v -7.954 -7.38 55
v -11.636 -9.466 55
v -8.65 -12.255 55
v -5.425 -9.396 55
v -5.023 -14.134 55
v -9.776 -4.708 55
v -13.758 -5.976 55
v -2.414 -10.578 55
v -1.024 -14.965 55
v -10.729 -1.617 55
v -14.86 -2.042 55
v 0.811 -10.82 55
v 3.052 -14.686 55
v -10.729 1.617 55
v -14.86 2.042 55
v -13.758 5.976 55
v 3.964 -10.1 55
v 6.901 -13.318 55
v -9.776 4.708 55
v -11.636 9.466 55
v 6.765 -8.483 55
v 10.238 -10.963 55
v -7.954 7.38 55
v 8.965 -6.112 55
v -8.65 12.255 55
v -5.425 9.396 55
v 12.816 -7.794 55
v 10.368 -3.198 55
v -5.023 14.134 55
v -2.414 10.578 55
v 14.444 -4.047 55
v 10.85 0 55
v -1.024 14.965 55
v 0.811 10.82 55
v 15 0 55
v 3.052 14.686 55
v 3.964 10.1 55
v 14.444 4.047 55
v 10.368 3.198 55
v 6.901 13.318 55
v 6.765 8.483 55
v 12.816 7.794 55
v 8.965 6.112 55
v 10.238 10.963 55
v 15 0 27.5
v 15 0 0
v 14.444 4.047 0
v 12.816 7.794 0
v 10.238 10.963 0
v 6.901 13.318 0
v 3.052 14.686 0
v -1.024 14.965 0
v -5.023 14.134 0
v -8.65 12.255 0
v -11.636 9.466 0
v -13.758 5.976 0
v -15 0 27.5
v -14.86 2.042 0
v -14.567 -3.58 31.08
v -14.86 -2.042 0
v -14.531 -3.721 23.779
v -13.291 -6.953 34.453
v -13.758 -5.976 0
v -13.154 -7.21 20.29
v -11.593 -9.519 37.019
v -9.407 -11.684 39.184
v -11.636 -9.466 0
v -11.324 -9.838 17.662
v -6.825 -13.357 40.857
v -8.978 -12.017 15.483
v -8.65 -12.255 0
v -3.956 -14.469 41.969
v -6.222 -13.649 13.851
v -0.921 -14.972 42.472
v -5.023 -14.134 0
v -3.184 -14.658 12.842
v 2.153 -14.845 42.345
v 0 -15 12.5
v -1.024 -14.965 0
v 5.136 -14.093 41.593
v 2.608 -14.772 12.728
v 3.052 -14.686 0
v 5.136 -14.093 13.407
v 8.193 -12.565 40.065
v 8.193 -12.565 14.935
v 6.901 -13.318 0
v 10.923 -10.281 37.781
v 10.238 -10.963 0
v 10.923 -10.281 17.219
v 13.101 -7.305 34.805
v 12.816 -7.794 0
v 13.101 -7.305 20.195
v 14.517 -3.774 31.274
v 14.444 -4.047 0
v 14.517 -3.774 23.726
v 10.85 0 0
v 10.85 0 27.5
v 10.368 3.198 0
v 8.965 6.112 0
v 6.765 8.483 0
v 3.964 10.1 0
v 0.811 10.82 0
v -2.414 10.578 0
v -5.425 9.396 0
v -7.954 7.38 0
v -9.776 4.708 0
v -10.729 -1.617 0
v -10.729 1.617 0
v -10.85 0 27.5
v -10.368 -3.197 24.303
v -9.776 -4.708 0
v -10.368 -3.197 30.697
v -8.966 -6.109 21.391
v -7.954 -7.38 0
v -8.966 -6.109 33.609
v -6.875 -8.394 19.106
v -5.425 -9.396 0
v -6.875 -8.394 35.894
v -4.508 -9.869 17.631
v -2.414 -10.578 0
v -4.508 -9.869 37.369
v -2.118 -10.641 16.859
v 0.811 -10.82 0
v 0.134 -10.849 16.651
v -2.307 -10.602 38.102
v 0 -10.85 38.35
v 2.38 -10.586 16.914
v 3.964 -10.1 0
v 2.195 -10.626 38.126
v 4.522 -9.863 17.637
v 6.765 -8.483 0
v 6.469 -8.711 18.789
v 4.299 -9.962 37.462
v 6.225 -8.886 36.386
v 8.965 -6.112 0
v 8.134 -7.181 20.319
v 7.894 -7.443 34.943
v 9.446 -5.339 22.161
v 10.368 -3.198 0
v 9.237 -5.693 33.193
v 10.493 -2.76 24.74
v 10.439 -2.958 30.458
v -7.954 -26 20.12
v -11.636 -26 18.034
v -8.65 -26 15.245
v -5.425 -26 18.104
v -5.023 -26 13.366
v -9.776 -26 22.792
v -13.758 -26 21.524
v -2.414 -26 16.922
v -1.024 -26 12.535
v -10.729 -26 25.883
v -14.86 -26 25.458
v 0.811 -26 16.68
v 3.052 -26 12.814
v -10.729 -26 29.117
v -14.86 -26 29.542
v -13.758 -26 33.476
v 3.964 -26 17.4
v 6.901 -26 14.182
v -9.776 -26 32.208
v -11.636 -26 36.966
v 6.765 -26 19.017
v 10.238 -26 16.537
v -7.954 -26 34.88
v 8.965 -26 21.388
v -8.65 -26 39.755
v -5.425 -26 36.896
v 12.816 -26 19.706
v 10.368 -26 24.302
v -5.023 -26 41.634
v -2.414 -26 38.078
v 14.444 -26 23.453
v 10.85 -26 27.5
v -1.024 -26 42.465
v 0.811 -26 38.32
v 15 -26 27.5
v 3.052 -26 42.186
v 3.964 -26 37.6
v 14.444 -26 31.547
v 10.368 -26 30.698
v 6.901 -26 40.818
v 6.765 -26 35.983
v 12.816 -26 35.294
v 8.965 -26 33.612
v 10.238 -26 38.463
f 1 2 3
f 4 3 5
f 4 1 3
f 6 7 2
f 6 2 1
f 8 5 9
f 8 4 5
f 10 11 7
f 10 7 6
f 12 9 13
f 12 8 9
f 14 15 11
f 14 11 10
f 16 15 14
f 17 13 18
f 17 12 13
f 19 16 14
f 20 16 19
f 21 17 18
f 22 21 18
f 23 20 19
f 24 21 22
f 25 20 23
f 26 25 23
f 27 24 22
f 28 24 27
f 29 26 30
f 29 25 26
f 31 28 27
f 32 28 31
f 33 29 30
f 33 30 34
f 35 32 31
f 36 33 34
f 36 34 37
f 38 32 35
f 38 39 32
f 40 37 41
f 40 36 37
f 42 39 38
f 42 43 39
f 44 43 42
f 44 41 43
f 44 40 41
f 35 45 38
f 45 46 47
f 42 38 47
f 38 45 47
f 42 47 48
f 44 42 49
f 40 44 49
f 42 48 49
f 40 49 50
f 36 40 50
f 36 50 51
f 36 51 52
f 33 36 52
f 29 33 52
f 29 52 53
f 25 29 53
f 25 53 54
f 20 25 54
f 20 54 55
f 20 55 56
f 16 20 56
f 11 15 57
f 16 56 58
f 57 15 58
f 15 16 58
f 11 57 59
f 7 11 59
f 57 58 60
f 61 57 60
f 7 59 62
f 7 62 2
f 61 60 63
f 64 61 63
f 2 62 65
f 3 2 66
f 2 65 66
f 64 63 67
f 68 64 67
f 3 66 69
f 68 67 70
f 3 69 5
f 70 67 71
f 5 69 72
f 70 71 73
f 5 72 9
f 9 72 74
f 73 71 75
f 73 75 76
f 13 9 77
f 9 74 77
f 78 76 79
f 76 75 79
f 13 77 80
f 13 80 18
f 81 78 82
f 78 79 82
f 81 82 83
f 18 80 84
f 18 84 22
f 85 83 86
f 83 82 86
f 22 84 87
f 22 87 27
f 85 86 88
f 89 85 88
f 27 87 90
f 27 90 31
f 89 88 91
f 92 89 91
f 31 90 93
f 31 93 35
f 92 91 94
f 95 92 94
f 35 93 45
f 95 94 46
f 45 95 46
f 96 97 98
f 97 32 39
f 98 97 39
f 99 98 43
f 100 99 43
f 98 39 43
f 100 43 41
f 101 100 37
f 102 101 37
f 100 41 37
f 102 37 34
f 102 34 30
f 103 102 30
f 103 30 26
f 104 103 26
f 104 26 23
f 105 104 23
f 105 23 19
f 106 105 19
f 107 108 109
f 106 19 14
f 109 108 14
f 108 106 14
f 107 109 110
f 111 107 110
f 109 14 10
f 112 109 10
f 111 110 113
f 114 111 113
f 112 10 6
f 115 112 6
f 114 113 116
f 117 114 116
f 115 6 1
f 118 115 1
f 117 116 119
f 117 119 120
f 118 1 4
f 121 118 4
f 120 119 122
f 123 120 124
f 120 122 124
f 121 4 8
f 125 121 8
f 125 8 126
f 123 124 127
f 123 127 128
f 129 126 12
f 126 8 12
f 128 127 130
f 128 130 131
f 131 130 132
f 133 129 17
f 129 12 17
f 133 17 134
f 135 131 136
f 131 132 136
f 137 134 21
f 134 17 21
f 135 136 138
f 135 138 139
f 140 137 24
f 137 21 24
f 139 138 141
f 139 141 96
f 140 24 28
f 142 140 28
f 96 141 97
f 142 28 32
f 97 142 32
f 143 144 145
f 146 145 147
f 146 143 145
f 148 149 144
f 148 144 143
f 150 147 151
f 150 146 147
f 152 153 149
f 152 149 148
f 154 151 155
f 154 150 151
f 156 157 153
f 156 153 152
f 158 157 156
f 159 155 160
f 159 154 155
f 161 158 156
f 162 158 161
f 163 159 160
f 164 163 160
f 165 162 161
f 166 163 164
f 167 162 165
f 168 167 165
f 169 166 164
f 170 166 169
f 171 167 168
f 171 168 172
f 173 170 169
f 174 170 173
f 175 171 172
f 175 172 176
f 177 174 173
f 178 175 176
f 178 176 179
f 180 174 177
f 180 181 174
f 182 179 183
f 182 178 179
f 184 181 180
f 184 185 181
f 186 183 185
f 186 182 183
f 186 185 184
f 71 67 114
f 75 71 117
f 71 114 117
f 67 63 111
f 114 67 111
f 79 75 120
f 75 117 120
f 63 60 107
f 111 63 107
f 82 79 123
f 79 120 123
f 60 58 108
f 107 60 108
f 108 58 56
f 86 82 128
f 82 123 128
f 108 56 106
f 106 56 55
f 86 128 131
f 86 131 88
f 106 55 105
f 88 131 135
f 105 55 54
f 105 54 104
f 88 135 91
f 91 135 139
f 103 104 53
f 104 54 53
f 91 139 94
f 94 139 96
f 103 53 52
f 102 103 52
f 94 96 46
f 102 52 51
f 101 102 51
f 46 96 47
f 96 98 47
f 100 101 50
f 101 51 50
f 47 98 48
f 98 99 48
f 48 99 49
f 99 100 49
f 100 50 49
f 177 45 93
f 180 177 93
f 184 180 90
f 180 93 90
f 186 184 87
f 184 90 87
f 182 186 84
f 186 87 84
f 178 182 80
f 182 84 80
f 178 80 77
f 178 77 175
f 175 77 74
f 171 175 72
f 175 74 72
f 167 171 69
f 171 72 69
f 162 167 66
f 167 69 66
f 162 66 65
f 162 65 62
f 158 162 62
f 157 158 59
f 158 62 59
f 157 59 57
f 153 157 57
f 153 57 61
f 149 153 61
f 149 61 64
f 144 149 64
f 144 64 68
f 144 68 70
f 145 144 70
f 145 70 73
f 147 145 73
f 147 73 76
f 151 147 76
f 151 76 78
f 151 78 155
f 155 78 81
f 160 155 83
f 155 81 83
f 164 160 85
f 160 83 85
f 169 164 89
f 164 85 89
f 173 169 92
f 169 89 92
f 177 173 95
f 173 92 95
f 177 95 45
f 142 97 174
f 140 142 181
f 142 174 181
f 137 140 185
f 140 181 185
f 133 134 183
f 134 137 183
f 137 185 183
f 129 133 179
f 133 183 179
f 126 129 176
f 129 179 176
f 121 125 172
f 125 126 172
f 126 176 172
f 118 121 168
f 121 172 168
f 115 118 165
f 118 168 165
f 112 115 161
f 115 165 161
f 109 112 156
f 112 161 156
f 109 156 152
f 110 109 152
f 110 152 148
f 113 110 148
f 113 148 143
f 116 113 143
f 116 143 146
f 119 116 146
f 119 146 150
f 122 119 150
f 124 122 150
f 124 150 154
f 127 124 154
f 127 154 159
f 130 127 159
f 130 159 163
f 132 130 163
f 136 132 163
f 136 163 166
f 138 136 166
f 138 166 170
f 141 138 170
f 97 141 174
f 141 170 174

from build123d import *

# Parameters (mm, degrees)
F0_R     = 15
F1_DEPTH = 55
F2_R     = 15
F3_DEPTH = 26
F4_R     = 10.85
F5_DEPTH = 55
F6_R     = 10.85
F7_DEPTH = 26


with BuildPart() as f1:
    # F0 (on Top) → F1 (new body)
    with BuildSketch(Plane.XY):
        Circle(F0_R)
    extrude(amount=F1_DEPTH)

    # F2 (on Front) → F3 (join)
    with BuildSketch(Plane.XZ):
        with Locations((0, 27.5)):
            Circle(F2_R)
    extrude(amount=F3_DEPTH)

    # F4 (on face) → F5 (cut)
    with BuildSketch(Plane.XY.offset(55)):
        Circle(F4_R)
    extrude(amount=-F5_DEPTH, mode=Mode.SUBTRACT)

    # F6 (on face) → F7 (cut)
    with BuildSketch(Plane.XZ.offset(26)):
        with Locations((0, 27.5)):
            Circle(F6_R)
    extrude(amount=-F7_DEPTH, mode=Mode.SUBTRACT)


solid = f1.part
